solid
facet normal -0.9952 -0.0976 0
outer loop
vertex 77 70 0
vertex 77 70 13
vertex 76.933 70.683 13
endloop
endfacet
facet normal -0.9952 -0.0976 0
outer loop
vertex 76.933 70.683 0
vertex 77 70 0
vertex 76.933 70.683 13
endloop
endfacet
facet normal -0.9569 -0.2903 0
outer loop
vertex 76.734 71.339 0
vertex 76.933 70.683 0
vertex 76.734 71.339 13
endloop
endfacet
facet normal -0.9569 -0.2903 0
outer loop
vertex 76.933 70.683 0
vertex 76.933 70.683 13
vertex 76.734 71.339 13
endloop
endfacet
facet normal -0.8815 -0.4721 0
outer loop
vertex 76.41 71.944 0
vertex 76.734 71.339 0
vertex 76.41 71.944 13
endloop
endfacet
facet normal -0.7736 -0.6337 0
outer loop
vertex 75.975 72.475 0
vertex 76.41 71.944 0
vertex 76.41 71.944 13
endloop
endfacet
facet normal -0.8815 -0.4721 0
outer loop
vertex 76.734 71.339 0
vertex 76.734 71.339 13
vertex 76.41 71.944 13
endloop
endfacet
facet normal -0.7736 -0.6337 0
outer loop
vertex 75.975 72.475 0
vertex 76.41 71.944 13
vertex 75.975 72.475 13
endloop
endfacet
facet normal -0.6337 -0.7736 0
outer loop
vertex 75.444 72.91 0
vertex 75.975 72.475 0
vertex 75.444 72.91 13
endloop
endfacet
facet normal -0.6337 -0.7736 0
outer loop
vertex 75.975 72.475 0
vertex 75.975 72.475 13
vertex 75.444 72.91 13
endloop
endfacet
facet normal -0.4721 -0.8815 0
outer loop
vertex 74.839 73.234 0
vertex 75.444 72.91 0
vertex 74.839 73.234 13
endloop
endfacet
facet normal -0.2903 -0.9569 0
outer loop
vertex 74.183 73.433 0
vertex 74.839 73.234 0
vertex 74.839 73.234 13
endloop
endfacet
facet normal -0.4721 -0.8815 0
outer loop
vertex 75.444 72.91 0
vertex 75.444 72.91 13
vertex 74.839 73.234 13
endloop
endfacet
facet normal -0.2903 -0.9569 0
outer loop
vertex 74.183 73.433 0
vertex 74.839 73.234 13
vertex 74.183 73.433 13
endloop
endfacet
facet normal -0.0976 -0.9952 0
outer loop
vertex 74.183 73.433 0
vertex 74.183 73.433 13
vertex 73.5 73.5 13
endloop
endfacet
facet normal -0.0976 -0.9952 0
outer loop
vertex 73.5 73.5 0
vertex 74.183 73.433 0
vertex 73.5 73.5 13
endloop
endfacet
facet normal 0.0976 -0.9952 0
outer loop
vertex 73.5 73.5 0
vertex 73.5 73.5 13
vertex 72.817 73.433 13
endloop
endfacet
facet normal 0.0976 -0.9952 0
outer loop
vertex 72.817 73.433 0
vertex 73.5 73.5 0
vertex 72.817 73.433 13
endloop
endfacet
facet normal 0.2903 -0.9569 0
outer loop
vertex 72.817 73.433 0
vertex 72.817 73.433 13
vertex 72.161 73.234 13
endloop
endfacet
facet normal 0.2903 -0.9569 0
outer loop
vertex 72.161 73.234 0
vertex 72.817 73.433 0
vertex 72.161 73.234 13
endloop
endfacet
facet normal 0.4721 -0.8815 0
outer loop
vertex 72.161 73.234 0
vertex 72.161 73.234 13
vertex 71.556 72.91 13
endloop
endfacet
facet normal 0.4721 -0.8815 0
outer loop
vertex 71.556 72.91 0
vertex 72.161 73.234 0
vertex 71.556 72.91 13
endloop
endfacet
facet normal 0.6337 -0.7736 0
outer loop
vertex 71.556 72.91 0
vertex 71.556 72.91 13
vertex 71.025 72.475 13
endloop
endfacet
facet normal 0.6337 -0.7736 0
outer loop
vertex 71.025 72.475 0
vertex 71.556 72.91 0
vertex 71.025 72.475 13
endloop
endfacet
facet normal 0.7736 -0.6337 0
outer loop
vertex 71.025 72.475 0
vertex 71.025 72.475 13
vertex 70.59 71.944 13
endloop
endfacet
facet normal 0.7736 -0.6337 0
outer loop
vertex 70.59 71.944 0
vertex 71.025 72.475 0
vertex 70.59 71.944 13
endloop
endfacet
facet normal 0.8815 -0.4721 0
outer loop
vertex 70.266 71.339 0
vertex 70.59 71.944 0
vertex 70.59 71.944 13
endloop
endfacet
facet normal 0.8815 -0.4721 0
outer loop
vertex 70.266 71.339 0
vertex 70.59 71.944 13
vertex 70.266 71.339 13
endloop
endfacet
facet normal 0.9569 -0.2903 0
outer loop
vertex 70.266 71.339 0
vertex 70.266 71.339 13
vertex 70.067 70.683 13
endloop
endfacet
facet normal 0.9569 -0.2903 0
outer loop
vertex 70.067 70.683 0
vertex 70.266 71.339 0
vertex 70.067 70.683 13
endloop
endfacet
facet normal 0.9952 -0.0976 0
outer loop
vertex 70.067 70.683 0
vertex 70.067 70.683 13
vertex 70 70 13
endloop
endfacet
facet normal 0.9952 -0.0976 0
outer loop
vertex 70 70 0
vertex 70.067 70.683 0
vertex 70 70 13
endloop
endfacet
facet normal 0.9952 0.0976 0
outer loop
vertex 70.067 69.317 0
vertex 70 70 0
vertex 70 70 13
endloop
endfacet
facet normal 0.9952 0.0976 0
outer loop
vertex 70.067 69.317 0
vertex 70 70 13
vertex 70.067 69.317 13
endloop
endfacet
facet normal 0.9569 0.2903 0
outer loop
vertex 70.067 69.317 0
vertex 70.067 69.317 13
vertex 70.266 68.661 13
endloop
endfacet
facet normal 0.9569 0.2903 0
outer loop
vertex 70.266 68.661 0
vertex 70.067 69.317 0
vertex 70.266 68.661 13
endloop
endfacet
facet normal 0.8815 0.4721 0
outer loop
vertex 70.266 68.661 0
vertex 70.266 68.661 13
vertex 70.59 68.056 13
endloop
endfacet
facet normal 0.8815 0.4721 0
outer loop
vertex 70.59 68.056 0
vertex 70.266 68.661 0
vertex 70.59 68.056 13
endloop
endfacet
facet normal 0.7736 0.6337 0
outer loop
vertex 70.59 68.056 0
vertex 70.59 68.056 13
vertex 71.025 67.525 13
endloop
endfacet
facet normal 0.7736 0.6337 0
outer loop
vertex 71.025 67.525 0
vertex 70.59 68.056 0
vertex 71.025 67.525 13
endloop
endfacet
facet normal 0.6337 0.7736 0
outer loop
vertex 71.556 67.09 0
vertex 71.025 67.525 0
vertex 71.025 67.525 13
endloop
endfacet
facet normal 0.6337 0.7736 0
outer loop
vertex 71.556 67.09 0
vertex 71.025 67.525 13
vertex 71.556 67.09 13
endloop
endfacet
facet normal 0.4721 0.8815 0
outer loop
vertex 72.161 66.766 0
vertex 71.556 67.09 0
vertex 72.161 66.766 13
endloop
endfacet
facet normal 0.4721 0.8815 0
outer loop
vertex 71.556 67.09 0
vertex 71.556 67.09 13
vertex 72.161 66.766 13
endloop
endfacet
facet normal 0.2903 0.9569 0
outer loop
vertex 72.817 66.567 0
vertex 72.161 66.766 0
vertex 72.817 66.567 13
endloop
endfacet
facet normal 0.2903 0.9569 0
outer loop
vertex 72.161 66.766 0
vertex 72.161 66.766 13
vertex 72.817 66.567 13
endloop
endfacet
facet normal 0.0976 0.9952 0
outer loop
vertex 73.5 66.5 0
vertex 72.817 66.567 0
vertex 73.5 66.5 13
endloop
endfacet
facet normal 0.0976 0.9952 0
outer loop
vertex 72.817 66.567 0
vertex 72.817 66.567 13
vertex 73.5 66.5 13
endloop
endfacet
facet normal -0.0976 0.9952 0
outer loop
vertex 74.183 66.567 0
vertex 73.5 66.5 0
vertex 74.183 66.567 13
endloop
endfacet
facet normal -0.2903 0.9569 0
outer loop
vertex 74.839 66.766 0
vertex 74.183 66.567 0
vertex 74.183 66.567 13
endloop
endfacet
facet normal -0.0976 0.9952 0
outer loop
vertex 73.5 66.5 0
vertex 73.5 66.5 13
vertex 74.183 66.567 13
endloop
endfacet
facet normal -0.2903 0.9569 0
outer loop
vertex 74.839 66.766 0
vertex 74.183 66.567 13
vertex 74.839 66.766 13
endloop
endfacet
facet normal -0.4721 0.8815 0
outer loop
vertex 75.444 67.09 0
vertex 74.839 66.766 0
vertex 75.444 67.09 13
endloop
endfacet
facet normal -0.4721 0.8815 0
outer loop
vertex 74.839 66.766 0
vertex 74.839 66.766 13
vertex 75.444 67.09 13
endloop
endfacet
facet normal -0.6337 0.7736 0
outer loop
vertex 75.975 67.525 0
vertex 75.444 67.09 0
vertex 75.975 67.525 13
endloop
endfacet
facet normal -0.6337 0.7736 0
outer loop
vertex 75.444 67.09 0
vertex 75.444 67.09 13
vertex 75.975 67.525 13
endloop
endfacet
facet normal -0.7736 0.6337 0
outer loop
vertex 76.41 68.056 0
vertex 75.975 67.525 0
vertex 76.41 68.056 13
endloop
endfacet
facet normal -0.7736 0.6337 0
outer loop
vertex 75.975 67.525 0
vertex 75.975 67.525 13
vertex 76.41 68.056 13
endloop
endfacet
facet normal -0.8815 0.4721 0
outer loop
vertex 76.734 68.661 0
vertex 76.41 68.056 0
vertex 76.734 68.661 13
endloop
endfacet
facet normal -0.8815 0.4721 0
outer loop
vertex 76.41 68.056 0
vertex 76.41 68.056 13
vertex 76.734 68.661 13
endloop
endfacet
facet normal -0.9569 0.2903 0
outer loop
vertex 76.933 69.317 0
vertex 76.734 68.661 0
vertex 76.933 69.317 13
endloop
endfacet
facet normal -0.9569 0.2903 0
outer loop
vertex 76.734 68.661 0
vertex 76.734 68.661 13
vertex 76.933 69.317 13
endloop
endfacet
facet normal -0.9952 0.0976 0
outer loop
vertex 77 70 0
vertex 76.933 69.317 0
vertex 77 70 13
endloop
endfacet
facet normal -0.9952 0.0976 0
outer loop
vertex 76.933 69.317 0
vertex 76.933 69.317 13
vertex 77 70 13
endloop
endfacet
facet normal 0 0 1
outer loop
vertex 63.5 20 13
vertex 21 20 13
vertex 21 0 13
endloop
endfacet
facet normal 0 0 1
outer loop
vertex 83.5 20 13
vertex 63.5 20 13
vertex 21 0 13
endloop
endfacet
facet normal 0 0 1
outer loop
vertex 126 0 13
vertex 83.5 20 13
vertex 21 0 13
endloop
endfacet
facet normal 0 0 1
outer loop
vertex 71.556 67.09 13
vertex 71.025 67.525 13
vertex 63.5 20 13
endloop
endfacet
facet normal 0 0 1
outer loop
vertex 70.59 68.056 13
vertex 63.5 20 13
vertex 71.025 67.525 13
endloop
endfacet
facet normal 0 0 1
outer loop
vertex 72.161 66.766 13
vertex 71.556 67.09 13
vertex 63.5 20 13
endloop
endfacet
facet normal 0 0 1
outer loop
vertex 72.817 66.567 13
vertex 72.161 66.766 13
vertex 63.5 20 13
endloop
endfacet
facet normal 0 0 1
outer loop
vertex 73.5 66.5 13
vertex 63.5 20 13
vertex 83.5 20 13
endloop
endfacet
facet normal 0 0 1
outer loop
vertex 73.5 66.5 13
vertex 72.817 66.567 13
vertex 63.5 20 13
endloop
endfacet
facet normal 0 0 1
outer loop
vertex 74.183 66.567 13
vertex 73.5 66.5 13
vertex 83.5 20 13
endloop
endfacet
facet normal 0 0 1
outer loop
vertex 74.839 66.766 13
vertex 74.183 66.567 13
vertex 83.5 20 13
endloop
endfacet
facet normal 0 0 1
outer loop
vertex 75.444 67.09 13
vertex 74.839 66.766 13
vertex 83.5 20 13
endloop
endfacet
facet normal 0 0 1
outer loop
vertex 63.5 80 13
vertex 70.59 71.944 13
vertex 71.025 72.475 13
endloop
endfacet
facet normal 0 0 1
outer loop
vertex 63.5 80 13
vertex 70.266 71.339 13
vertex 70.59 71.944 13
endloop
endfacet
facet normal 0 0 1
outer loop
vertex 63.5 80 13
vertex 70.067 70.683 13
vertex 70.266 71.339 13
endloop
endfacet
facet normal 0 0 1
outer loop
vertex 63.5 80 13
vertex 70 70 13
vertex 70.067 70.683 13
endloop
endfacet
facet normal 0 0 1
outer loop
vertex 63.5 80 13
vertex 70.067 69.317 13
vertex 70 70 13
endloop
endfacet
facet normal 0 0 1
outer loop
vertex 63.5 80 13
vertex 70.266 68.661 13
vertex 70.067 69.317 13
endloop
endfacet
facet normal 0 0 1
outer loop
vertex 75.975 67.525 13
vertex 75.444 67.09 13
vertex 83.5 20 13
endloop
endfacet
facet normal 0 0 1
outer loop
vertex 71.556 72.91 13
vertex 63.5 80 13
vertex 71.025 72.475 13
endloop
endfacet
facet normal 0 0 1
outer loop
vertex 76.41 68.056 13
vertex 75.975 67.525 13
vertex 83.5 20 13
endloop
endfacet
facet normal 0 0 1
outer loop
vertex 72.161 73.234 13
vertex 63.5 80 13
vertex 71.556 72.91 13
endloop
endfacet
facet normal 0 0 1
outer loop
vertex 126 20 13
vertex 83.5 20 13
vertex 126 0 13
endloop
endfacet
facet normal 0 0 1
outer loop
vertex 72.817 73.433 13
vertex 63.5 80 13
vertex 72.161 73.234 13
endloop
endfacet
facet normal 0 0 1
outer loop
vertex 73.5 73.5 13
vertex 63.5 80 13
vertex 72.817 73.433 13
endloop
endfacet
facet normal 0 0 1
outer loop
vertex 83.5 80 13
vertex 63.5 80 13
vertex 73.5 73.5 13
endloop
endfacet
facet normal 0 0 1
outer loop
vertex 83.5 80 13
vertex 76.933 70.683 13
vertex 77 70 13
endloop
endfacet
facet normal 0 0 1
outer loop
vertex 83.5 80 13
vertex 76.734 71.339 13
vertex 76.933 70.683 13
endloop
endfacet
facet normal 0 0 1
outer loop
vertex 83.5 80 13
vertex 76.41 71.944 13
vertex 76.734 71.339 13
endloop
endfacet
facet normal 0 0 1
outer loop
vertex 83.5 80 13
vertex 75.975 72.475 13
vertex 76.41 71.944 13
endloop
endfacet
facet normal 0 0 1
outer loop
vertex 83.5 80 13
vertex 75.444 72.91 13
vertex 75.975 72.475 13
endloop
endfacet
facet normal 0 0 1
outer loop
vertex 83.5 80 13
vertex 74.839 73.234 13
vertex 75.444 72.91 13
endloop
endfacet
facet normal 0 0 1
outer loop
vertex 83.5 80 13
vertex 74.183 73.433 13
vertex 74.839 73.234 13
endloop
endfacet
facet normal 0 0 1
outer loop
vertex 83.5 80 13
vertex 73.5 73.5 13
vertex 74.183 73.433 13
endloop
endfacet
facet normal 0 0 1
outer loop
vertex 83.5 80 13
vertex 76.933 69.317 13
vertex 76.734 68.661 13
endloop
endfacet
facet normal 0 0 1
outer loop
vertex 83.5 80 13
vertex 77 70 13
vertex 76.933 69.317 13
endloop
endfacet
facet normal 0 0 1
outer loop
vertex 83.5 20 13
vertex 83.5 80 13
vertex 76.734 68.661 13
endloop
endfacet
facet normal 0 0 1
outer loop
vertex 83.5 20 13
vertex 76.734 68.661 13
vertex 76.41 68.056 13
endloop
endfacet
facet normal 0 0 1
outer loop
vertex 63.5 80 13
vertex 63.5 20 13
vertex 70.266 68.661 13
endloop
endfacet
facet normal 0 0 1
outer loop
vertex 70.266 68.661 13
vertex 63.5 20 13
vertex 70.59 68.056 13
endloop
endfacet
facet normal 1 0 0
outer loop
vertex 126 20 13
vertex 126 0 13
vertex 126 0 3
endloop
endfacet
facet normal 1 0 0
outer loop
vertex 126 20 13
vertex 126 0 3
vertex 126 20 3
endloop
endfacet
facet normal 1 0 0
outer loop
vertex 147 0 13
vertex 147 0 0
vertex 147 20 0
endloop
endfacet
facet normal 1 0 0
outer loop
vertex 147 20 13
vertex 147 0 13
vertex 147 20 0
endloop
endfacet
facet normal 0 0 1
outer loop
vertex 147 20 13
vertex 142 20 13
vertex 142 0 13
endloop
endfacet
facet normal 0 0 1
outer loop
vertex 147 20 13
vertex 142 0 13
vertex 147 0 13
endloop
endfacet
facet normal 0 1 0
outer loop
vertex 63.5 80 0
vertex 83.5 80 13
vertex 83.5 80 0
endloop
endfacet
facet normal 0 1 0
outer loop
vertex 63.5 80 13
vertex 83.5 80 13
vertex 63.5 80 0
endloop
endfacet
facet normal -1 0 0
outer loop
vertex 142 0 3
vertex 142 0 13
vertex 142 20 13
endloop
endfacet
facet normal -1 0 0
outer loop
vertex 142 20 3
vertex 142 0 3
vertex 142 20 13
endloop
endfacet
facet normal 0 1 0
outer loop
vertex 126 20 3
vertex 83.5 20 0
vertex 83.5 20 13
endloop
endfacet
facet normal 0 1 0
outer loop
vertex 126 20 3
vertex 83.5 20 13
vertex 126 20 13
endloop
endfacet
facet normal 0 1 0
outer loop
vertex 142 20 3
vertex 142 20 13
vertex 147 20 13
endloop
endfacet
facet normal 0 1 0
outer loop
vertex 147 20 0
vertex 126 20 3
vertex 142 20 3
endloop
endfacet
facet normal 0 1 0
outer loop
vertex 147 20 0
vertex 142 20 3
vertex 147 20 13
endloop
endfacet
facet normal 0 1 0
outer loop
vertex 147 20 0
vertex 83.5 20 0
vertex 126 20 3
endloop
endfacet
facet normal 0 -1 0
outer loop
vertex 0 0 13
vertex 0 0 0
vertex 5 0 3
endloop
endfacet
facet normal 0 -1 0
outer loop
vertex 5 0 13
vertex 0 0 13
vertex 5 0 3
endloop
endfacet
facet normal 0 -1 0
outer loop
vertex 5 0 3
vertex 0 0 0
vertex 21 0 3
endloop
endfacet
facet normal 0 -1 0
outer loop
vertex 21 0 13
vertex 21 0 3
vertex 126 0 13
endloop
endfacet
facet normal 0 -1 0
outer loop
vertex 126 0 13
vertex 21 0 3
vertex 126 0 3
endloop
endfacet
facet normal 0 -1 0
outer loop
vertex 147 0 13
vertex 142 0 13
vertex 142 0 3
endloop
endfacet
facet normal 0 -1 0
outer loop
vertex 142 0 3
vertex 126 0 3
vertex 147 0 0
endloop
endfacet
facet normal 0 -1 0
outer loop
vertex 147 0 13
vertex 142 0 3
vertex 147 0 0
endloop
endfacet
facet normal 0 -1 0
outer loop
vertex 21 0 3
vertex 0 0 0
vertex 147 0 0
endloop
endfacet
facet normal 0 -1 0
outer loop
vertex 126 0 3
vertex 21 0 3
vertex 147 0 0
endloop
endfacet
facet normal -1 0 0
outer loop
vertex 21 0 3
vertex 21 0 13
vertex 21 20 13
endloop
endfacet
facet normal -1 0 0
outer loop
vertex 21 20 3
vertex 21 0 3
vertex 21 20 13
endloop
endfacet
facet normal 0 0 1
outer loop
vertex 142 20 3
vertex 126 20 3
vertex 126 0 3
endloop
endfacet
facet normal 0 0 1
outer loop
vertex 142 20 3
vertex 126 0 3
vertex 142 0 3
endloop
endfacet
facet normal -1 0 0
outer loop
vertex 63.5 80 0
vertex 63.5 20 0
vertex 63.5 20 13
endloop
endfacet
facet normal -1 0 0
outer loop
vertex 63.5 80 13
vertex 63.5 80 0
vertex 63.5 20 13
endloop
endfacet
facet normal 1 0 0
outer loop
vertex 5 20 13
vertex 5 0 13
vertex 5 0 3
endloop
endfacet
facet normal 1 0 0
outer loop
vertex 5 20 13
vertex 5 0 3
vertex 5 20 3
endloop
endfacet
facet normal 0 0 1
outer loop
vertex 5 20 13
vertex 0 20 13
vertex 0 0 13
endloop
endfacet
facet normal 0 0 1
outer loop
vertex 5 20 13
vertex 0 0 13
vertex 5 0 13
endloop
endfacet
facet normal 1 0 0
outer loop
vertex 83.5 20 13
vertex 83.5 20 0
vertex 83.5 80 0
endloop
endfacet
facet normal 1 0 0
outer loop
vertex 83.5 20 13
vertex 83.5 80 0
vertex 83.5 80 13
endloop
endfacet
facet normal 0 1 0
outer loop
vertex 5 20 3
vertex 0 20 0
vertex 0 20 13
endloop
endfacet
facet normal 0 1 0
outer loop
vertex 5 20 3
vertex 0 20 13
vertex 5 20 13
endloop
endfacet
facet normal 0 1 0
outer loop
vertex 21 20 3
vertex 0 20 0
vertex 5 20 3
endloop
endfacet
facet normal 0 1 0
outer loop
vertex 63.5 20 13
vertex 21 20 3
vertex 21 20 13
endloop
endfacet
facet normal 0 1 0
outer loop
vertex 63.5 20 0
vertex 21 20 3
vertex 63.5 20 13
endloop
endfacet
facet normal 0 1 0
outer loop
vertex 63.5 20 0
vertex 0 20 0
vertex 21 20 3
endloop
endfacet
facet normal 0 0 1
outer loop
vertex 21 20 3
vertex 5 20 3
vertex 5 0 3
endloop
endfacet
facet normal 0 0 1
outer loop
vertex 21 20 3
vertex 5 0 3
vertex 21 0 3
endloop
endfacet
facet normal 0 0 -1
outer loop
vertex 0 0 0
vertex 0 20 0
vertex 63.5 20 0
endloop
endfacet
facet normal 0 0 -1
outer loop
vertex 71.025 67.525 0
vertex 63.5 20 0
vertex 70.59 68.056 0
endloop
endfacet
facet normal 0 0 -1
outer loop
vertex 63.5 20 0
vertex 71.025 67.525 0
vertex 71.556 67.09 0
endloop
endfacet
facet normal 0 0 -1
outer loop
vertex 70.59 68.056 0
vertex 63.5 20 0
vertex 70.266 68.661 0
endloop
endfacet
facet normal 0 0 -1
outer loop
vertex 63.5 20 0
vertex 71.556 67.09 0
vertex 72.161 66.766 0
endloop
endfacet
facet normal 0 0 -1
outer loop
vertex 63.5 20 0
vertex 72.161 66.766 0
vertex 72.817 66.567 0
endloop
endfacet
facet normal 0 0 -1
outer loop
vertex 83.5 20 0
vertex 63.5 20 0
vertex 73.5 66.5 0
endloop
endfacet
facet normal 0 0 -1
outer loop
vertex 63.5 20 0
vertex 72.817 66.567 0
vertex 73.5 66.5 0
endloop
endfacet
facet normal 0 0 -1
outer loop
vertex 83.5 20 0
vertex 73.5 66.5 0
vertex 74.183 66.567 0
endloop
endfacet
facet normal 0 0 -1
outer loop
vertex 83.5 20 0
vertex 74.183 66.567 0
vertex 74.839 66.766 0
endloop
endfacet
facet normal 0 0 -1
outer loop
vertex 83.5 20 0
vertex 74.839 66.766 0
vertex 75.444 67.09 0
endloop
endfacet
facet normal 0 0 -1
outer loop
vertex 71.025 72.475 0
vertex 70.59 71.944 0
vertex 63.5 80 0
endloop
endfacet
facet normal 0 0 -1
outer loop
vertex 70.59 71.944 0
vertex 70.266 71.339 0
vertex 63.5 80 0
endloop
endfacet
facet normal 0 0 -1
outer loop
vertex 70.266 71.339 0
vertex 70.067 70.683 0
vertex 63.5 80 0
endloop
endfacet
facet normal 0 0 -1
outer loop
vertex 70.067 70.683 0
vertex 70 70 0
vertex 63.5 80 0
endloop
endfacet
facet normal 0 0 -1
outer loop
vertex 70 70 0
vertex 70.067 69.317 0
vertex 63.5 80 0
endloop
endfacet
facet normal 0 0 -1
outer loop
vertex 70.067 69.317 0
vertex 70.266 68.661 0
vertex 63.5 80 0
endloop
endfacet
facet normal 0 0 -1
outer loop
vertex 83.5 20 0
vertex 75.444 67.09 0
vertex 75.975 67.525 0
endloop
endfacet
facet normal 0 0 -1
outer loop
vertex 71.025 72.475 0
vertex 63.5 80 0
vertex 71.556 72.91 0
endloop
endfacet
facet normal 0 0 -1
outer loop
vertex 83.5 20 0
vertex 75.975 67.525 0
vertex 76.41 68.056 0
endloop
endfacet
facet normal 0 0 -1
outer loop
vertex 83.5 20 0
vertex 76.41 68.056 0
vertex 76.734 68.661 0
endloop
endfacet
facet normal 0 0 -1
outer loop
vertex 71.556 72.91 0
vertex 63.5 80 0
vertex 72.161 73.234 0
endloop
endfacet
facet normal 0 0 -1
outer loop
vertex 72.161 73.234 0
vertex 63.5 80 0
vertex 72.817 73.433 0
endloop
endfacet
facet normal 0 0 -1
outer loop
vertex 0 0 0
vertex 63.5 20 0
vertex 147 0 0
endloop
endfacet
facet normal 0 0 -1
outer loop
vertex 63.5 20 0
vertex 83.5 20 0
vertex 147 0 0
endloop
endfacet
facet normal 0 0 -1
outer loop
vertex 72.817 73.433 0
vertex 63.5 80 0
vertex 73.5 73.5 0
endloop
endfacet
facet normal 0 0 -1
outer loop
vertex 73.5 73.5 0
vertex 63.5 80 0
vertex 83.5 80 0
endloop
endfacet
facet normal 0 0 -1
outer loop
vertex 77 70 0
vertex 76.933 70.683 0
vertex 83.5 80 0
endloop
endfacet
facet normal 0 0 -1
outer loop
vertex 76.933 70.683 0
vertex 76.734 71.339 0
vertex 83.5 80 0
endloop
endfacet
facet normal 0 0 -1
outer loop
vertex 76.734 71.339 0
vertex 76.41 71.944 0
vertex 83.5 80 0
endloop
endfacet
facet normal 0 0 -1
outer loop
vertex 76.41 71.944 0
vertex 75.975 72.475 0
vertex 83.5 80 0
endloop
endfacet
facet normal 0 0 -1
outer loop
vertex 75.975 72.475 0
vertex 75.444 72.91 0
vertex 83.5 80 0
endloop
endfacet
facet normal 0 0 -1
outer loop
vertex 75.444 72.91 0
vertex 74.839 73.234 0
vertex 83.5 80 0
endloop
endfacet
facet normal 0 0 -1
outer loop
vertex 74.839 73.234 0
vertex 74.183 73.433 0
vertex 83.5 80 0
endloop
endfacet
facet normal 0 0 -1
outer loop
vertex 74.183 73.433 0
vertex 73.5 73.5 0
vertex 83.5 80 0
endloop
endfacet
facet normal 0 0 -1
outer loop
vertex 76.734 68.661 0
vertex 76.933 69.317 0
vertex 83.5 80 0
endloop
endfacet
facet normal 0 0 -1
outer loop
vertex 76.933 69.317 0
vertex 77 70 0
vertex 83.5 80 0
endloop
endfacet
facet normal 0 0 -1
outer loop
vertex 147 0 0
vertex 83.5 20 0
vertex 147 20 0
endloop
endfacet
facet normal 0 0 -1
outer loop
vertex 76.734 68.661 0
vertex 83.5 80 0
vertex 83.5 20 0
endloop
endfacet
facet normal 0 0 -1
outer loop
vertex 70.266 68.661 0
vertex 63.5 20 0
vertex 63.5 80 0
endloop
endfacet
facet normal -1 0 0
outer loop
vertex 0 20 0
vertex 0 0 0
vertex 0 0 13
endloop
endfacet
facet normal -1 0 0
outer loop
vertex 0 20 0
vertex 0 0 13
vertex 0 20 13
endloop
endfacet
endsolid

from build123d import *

# Parameters (mm, degrees)
SKETCH_W        = 147
SKETCH_H        = 20
PAD_DEPTH       = 13
SKETCH001_W     = 16
SKETCH001_H     = 20
POCKET_DEPTH    = 10
SKETCH002_W     = 20
SKETCH002_H     = 13
PAD001_DEPTH    = 60
SKETCH003_R     = 3.5
POCKET001_DEPTH = 13.001


with BuildPart() as part:
    # Sketch → Pad (new body)
    with BuildSketch(Plane.XY):
        with Locations((73.5, 10)):
            Rectangle(SKETCH_W, SKETCH_H)
    extrude(amount=PAD_DEPTH)

    # Sketch001 (on Face6 of Pad) → Pocket (cut)
    with BuildSketch(Plane.XY.offset(13)):
        with Locations((13, 10)):
            Rectangle(SKETCH001_W, SKETCH001_H)
        with Locations((134, 10)):
            Rectangle(SKETCH001_W, SKETCH001_H)
    extrude(amount=-POCKET_DEPTH, mode=Mode.SUBTRACT)

    # Sketch002 (on Face14 of Pocket) → Pad001 (join)
    with BuildSketch(Plane(origin=(0, 20, 0), x_dir=(-1, 0, 0), z_dir=(0, 1, 0))):
        with Locations((-73.5, 6.5)):
            Rectangle(SKETCH002_W, SKETCH002_H)
    extrude(amount=PAD001_DEPTH)

    # Sketch003 (on Face17 of Pad001) → Pocket001 (cut, through all)
    with BuildSketch(Plane.XY.offset(13)):
        with Locations((73.5, 70)):
            Circle(SKETCH003_R)
    extrude(amount=-POCKET001_DEPTH, mode=Mode.SUBTRACT)


solid = part.part
